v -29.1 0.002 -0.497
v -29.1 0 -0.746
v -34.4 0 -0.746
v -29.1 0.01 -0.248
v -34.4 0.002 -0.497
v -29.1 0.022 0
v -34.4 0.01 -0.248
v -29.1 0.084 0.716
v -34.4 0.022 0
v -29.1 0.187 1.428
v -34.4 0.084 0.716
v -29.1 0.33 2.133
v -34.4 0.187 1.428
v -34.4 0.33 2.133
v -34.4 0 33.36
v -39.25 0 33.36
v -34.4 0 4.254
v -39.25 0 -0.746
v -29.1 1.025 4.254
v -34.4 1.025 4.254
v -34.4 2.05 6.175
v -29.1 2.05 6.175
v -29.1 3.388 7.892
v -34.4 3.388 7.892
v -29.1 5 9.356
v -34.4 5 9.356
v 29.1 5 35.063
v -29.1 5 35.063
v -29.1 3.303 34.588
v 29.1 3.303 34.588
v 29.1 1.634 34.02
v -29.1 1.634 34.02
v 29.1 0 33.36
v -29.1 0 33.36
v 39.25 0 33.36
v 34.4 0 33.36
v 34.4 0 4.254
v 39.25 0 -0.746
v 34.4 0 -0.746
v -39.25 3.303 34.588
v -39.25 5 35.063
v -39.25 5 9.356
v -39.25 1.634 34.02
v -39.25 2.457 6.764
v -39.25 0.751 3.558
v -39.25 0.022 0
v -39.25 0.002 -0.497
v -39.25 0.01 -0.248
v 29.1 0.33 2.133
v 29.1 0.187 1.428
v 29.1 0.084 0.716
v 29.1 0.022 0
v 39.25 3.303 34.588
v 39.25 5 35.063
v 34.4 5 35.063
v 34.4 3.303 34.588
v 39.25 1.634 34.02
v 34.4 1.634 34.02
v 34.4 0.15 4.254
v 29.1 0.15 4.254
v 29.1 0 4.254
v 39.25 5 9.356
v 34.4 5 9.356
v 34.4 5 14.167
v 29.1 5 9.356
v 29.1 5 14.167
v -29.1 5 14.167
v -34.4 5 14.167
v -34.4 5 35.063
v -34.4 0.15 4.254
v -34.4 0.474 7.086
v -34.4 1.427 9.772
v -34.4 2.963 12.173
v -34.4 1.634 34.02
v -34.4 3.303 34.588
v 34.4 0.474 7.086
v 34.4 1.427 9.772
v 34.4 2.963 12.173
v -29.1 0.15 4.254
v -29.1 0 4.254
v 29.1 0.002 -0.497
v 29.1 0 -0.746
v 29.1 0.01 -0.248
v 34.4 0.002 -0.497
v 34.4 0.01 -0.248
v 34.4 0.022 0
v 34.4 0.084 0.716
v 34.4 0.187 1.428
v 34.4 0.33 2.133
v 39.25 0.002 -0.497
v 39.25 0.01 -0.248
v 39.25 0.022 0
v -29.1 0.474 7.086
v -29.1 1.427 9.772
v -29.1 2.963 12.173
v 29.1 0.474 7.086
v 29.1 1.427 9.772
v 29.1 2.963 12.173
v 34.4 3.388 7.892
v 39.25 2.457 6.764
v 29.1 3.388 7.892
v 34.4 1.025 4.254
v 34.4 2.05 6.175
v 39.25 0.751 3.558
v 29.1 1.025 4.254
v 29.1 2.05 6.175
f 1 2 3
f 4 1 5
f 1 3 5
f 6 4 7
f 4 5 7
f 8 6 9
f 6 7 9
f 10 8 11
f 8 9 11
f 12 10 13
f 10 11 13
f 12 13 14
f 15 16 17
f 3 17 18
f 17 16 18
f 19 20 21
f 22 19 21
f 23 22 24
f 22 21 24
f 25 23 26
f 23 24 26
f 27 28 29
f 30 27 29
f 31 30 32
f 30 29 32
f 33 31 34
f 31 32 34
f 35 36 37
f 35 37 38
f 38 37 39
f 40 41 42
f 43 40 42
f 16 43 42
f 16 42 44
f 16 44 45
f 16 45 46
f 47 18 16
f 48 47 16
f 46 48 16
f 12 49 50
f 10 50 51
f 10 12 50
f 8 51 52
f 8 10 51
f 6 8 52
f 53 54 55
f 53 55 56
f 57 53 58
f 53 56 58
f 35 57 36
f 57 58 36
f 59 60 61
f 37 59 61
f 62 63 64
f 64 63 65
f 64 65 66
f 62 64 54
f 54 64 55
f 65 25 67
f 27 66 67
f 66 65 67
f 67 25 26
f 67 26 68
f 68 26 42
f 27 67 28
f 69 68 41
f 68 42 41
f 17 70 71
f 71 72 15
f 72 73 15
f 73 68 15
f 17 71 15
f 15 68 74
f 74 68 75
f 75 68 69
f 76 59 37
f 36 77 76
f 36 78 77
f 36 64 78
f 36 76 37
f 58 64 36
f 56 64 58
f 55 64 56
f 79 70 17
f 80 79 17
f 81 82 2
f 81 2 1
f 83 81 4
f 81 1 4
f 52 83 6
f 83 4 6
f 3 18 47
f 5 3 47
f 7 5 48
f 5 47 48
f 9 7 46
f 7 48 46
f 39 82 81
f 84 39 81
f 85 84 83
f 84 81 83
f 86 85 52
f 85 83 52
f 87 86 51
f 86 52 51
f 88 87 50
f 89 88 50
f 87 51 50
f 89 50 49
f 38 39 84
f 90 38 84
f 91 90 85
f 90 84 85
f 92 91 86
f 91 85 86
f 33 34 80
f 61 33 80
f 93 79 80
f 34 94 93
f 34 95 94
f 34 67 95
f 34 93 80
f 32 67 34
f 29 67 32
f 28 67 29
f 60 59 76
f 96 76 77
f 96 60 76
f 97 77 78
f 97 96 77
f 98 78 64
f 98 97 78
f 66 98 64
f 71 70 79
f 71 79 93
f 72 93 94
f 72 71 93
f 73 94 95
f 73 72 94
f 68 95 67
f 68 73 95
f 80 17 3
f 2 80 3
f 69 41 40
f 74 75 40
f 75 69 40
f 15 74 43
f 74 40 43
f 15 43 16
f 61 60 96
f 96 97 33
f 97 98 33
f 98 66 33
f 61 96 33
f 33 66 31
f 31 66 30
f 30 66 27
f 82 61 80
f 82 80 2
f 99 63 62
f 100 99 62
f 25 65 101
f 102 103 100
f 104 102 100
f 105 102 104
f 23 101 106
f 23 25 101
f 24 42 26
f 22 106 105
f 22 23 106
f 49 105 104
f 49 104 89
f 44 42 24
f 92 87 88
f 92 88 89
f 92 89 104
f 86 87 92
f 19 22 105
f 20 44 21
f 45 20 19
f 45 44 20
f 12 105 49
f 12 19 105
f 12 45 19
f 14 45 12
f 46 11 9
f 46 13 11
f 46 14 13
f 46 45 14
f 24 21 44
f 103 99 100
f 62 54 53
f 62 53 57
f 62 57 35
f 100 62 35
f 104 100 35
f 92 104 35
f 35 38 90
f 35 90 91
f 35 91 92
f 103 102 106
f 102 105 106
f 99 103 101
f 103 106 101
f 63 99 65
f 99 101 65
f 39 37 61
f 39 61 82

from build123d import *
from build123d.topology import SkipClean

# Parameters (mm, degrees)
BOSS_EXTRUDE1_DEPTH     = 5
BOSS_EXTRUDE2_START     = -39.25
BOSS_EXTRUDE2_DEPTH     = 78.5
CUT_EXTRUDE2_START      = 5.3
SKETCH4_R               = 31.757795359
SKETCH4_R_2             = 12.555236476
CUT_EXTRUDE2_DEPTH      = 5.3
CUT_EXTRUDE3_START      = -58.2
SKETCH4_2_R             = 31.757795359
SKETCH4_2_R_2           = 12.555236476
CUT_EXTRUDE3_DEPTH      = 5.3
CUT_EXTRUDE1_DEPTH      = 53.867491885
CUT_EXTRUDE1_DEPTH_BACK = 53.867491885
SKETCH3_R               = 12.705236476
BOSS_EXTRUDE3_START     = -34.4
BOSS_EXTRUDE3_DEPTH     = 68.8


# Read off the part's stored shape, not the designer's step: Boss-Extrude3
with BuildPart() as part:
    # Sketch1 → Boss-Extrude1 (new body)
    with BuildSketch(Plane(origin=(0, 0, 0), x_dir=(1, 0, 0), z_dir=(0, 1, 0))):
        Polygon((-39.25, 0), (39.25, 0), (39.25, -15.758241935), (34.4, -15.758241935), (34.4, -4.254055051), (29.1, -4.254055051), (29.1, -15.758241935), (-29.1, -15.758241935), (-29.1, -4.254055051), (-34.4, -4.254055051), (-34.4, -15.758241935), (-39.25, -15.758241935), align=None)
    extrude(amount=BOSS_EXTRUDE1_DEPTH)

    # Sketch2 → Boss-Extrude2 (add)
    with BuildSketch(Plane(origin=(0, 0, 0), x_dir=(0, 0, -1), z_dir=(1, 0, 0)).offset(BOSS_EXTRUDE2_START)):
        with BuildLine():
            ThreePointArc((-4.254055051, 0), (-9.889930421, 1.318404488), (-14.356152099, 5))
            Line((-14.356152099, 5), (-35.062931969, 5))
            ThreePointArc((-35.062931969, 5), (-34.315415728, 2.464525546), (-33.359630671, 0))
            Line((-33.359630671, 0), (-4.254055051, 0))
        make_face()
        with BuildLine():
            ThreePointArc((-1.754055051, 0.248389607), (-5.988122383, 1.931408415), (-9.356152099, 5))
            Line((-9.356152099, 5), (-14.356152099, 5))
            ThreePointArc((-14.356152099, 5), (-9.889930421, 1.318404488), (-4.254055051, 0))
            ThreePointArc((-4.254055051, 0), (-2.997900463, 0.0622499), (-1.754055051, 0.248389607))
        make_face()
        with BuildLine():
            ThreePointArc((0.745944949, 0), (-0.510209639, 0.0622499), (-1.754055051, 0.248389607))
            ThreePointArc((-1.754055051, 0.248389607), (-2.997900463, 0.0622499), (-4.254055051, 0))
            Line((-4.254055051, 0), (0, 0))
            Line((0, 0), (0.745944949, 0))
        make_face()
    extrude(amount=BOSS_EXTRUDE2_DEPTH)

    # Sketch4 → Cut-Extrude2 (cut)
    with BuildSketch(Plane.ZY.offset(29.1).offset(CUT_EXTRUDE2_START)):
        with Locations((4.254055051, 12.705236476)):
            Circle(SKETCH4_R)
        with Locations((4.254055051, 12.705236476)):
            Circle(SKETCH4_R_2, mode=Mode.SUBTRACT)
    extrude(amount=-CUT_EXTRUDE2_DEPTH, mode=Mode.SUBTRACT)

    # Sketch4<2> → Cut-Extrude3 (cut)
    with BuildSketch(Plane.ZY.offset(29.1).offset(CUT_EXTRUDE3_START)):
        with Locations((4.254055051, 12.705236476)):
            Circle(SKETCH4_2_R)
        with Locations((4.254055051, 12.705236476)):
            Circle(SKETCH4_2_R_2, mode=Mode.SUBTRACT)
    extrude(amount=-CUT_EXTRUDE3_DEPTH, mode=Mode.SUBTRACT)

    # Sketch3 → Cut-Extrude1 (cut, two sides: drawn at the far end of the back side and taken through both)
    with SkipClean():  # the faces are left unmerged after this step: merging them gives an invalid solid
        with BuildSketch(Plane(origin=(0, 0, 0), x_dir=(0, 0, -1), z_dir=(1, 0, 0)).offset(-CUT_EXTRUDE1_DEPTH_BACK)):
            with Locations((0.745944949, 12.705236476)):
                Circle(SKETCH3_R)
        extrude(amount=CUT_EXTRUDE1_DEPTH + CUT_EXTRUDE1_DEPTH_BACK, mode=Mode.SUBTRACT)

    # Boss-Extrude3 outline → Boss-Extrude3 (add)
    with SkipClean():  # the faces are left unmerged after this step: merging them gives an invalid solid
        with BuildSketch(Plane(origin=(0, 0, 0), x_dir=(0, 0, -1), z_dir=(1, 0, 0)).offset(BOSS_EXTRUDE3_START)):
            with BuildLine():
                Line((-4.254055051, 0), (0.745944949, 0))
                ThreePointArc((0.745944949, 0), (-0.702961041, 0.082887038), (-2.132962145, 0.330466666))
                ThreePointArc((-2.132962145, 0.330466666), (-3.189676907, 0.195198022), (-4.254055051, 0.15))
                Line((-4.254055051, 0.15), (-4.254055051, 0))
            make_face()
        extrude(amount=BOSS_EXTRUDE3_DEPTH)


solid = part.part
